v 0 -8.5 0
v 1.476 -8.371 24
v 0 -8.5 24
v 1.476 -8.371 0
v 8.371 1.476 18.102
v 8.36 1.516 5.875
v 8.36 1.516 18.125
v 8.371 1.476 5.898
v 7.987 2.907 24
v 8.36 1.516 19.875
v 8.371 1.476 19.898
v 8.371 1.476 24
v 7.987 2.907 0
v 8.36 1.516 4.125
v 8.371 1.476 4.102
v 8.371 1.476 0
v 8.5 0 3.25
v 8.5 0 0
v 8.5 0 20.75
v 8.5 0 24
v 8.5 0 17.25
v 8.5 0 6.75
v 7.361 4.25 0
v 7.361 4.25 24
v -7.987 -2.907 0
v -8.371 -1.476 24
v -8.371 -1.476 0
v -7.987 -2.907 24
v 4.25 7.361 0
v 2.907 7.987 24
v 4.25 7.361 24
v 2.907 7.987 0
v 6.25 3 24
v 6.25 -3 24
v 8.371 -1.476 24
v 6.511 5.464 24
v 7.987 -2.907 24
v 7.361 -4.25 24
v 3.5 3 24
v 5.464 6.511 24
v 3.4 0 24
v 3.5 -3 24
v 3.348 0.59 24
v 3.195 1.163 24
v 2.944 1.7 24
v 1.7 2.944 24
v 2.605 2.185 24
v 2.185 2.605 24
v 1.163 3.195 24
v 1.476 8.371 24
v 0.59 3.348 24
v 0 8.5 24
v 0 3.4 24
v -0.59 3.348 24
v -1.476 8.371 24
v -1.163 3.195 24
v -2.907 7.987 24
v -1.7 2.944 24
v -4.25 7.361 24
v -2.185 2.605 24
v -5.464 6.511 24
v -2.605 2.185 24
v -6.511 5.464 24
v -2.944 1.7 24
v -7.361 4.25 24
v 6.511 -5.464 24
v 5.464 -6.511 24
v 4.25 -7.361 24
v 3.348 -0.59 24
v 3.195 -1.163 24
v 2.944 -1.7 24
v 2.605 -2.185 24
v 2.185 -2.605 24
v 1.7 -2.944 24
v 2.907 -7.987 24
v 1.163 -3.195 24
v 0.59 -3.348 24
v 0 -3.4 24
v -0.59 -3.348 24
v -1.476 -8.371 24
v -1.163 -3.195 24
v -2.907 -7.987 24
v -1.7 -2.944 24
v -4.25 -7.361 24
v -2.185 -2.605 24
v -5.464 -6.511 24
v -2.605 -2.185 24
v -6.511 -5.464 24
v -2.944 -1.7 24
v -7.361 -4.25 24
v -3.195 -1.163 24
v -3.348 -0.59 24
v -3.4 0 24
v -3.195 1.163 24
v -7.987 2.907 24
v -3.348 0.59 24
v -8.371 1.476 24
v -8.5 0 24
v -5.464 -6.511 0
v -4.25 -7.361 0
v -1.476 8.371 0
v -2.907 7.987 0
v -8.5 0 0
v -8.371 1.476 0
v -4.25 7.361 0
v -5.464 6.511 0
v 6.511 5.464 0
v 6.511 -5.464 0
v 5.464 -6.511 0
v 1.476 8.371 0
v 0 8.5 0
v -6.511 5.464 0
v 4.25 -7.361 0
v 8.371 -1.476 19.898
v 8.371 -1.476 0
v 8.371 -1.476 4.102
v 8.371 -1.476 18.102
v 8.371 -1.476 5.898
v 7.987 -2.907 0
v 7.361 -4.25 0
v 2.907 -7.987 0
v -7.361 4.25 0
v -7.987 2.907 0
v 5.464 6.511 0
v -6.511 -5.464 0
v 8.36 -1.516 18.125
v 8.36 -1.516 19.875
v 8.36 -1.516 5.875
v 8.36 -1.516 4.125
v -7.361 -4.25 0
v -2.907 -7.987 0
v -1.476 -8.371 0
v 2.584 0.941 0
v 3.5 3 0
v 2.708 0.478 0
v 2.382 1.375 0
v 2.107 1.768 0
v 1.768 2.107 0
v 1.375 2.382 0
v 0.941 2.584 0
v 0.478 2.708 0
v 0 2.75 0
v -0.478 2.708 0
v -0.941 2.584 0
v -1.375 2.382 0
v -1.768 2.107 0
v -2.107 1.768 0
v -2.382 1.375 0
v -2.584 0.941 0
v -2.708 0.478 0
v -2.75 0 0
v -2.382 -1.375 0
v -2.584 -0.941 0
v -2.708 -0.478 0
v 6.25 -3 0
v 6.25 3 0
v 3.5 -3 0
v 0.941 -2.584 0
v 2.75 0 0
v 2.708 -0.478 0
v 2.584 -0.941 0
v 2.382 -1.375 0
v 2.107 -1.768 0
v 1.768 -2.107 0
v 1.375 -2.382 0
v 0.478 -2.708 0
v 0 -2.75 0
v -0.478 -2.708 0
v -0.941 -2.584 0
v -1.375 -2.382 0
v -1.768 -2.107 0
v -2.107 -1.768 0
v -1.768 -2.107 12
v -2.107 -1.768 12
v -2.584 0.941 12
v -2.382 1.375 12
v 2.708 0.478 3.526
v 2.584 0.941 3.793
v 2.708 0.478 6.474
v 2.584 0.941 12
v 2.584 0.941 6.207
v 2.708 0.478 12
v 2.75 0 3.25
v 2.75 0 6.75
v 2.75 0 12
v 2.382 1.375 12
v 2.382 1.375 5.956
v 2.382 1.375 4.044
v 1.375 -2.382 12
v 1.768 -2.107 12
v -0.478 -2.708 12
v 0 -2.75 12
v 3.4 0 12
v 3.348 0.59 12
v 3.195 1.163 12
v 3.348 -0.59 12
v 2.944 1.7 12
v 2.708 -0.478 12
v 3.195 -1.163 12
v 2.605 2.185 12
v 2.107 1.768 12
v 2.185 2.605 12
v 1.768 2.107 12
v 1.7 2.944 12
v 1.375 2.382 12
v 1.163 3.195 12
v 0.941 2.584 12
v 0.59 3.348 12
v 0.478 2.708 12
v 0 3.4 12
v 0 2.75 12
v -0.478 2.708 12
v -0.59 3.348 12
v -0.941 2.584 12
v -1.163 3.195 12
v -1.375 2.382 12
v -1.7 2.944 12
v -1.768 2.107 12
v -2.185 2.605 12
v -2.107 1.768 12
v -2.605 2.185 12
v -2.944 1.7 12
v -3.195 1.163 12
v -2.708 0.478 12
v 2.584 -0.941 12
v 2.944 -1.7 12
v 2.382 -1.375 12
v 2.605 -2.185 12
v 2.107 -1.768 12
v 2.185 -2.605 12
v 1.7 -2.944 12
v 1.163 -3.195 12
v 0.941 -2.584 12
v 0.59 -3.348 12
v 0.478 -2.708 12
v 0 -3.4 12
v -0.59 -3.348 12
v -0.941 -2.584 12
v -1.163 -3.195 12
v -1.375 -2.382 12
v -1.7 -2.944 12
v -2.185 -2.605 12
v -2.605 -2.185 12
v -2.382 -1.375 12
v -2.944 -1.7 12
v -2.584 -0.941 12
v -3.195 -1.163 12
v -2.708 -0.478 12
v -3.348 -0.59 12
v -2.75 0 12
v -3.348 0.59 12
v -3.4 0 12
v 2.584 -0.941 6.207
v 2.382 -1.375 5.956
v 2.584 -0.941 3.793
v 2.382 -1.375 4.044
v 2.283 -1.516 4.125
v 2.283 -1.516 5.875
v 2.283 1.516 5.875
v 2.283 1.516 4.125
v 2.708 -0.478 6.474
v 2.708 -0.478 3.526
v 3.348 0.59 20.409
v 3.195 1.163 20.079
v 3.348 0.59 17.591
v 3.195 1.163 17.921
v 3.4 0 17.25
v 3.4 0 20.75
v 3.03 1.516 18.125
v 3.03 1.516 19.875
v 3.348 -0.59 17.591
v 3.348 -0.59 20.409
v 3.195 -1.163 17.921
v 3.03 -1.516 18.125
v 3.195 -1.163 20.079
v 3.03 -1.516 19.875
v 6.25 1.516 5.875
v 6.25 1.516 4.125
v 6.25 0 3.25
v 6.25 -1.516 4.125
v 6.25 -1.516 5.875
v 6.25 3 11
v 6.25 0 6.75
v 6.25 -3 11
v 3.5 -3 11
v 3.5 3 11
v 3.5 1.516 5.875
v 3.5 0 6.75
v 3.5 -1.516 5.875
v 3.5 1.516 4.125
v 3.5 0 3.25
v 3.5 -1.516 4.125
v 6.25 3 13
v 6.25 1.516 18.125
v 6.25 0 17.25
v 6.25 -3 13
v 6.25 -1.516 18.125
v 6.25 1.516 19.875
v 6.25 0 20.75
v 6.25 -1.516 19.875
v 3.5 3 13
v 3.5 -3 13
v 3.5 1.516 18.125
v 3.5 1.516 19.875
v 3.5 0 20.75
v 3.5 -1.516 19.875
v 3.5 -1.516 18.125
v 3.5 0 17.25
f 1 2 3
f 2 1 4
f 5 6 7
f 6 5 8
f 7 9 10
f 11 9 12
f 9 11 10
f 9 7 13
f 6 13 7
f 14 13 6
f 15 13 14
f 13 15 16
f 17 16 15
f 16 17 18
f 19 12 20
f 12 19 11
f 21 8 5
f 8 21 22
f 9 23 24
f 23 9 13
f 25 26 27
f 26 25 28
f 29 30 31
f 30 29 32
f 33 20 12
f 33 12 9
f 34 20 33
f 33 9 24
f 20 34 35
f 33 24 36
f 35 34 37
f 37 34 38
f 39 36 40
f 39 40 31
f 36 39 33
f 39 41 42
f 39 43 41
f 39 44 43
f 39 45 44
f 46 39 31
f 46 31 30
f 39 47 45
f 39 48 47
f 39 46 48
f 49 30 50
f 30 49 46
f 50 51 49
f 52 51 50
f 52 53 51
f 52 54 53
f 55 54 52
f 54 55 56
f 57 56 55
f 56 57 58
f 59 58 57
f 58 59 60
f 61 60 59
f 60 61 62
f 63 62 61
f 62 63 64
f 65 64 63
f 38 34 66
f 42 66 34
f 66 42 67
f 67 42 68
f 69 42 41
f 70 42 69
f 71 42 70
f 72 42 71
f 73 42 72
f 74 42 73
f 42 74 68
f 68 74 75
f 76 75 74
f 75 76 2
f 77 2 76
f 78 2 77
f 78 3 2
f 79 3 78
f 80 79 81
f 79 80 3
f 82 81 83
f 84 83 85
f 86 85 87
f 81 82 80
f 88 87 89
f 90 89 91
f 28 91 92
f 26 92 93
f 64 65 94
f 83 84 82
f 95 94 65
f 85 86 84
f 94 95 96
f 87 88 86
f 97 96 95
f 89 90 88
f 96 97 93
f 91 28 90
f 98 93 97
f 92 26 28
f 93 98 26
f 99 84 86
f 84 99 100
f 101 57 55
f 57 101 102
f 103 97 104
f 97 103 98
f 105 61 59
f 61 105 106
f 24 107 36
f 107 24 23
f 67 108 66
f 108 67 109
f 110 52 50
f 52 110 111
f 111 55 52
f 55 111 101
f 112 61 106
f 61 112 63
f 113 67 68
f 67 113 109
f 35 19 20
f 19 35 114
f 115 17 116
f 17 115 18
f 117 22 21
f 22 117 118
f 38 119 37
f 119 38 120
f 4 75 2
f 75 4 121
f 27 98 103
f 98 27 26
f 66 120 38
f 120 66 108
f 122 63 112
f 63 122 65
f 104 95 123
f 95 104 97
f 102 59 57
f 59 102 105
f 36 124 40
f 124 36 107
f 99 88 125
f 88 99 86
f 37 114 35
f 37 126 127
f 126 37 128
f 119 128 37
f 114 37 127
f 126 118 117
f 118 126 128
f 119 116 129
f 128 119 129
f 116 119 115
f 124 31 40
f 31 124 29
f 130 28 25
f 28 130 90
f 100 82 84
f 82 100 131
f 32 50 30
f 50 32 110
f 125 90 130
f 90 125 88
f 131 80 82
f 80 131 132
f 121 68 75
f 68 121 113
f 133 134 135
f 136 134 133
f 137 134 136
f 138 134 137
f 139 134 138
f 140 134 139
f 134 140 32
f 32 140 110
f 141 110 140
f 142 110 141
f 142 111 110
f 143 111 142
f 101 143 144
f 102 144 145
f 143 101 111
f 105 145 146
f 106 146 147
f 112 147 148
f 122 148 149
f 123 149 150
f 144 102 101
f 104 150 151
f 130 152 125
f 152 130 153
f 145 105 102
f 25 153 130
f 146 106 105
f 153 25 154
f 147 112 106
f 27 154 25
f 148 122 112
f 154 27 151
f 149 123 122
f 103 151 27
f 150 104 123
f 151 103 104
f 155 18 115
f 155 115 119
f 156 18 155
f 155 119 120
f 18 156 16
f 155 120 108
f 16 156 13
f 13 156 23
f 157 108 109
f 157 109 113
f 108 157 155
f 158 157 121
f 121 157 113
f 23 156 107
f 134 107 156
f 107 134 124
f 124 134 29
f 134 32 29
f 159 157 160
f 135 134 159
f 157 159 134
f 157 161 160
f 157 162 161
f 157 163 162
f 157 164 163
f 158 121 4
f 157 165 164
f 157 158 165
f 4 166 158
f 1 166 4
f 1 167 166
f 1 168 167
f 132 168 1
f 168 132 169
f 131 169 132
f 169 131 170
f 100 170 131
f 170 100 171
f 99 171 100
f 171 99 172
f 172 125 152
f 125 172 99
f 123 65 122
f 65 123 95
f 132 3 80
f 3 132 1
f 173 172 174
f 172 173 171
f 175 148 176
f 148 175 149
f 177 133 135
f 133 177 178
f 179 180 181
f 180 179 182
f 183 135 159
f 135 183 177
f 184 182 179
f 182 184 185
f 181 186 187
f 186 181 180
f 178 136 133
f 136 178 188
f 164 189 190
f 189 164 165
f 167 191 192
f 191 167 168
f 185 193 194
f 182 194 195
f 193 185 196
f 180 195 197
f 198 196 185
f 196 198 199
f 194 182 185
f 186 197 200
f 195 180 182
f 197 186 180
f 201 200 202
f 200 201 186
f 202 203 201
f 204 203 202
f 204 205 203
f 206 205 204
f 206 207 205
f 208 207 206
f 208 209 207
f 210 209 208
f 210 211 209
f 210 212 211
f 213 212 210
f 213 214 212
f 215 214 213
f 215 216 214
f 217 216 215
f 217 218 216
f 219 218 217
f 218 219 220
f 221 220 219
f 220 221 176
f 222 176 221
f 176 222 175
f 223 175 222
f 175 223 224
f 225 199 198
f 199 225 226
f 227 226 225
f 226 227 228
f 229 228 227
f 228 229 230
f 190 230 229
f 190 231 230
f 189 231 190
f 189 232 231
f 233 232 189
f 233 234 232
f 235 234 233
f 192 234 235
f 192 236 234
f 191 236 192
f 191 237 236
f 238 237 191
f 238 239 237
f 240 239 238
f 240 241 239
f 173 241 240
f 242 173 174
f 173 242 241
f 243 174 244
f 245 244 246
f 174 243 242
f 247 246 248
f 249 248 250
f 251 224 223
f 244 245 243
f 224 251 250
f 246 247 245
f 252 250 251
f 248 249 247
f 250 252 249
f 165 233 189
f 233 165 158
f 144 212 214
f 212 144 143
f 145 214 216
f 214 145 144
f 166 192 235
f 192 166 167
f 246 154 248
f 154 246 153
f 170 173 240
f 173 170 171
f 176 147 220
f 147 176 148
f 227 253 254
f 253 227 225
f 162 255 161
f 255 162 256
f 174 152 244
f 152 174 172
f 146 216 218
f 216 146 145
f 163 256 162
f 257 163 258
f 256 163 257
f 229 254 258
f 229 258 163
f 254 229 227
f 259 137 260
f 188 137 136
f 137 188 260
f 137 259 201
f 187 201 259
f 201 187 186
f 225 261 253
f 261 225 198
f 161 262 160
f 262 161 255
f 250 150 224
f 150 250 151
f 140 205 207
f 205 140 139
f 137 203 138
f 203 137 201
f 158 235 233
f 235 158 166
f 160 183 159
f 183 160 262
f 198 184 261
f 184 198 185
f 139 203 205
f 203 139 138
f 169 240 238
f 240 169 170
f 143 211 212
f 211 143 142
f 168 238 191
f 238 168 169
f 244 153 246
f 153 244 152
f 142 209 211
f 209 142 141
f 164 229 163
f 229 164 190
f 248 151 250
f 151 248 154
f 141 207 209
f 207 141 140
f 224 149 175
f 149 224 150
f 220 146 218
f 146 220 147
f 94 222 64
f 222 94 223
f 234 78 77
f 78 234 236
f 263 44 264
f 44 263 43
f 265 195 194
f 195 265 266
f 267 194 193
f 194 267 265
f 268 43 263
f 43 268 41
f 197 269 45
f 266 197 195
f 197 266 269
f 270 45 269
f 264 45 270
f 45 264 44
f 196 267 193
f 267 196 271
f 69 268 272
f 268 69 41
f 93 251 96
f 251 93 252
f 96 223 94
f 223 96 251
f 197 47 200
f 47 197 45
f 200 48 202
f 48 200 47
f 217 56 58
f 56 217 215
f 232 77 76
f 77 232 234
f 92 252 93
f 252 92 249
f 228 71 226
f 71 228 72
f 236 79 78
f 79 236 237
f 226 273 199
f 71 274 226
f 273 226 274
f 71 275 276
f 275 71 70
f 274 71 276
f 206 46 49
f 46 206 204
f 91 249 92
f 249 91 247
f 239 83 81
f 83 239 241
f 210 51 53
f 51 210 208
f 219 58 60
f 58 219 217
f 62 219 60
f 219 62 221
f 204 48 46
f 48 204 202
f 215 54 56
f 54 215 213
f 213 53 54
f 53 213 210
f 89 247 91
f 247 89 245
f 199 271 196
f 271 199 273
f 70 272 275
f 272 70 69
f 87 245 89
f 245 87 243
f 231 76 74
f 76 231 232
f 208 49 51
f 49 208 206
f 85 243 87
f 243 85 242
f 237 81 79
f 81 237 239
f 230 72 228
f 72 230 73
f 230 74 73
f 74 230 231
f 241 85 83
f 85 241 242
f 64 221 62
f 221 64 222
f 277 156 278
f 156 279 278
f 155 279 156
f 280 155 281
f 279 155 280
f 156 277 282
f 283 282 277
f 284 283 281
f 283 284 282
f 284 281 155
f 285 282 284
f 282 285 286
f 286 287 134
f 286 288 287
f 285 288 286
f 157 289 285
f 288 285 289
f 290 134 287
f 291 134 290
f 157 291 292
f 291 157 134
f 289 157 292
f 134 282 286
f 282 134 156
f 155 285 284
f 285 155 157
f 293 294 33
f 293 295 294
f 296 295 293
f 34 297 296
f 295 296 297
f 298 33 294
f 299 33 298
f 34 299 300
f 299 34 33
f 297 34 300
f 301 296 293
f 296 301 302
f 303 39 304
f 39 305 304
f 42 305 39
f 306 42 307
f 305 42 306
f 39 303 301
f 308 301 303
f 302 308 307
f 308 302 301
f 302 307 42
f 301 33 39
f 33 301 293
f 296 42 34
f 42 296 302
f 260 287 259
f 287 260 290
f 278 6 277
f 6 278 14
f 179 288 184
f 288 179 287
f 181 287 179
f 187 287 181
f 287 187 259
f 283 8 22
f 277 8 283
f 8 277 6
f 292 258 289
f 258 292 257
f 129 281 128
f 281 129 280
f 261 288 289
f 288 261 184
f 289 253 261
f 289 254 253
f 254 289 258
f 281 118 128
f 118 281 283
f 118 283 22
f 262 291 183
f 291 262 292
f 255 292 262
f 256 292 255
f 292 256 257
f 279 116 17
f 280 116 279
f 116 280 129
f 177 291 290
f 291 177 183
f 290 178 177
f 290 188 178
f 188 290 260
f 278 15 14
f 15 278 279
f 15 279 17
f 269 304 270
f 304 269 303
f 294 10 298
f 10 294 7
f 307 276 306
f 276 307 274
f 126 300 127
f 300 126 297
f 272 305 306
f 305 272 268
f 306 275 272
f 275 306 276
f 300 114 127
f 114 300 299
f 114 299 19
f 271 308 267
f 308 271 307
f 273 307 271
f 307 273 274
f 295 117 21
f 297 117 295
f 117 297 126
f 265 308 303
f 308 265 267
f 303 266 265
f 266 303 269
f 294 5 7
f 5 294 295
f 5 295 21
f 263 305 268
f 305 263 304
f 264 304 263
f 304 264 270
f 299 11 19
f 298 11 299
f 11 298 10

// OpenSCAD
down_radius = 2.75;
down_heigth = 12;
up_radius = 3.4;
up_heigth = 12;
out_radius = 8.5;
slot_width = 6;
slot_depth = 2.75;
slot_offset = 3.5;
slot_bottom = 1;
bolt_radius = 1.75;
bolt_location = 5;


difference()
{
	// Coupling body
	cylinder(r=out_radius, h=up_heigth+down_heigth, $fn=36);
	
	// Bottom hole
	cylinder(r=down_radius, h=down_heigth, $fn=36);

	// Top hole
	translate([0,0,down_heigth])
		cylinder(r=up_radius, h=up_heigth, $fn=36);

	// Bottom slot
	translate([slot_offset,-1*slot_width/2,0])
		cube([slot_depth,slot_width,down_heigth-slot_bottom]);

	// Top slot
	translate([slot_offset,-1*slot_width/2,down_heigth+slot_bottom])
		cube([slot_depth,slot_width,up_heigth-slot_bottom]);

	// Bottom bolt hole
	translate([0,0,bolt_location])
		rotate(a=90, v=[0,1,0])
			rotate(a=180, v=[0,0,1])
				cylinder(r=bolt_radius, h=1.25*out_radius);

	// Top bolt hole
	translate([0,0,down_heigth+up_heigth-bolt_location])
		rotate(a=90, v=[0,1,0])
			rotate(a=180, v=[0,0,1])
				cylinder(r=bolt_radius, h=1.25*out_radius);
}
